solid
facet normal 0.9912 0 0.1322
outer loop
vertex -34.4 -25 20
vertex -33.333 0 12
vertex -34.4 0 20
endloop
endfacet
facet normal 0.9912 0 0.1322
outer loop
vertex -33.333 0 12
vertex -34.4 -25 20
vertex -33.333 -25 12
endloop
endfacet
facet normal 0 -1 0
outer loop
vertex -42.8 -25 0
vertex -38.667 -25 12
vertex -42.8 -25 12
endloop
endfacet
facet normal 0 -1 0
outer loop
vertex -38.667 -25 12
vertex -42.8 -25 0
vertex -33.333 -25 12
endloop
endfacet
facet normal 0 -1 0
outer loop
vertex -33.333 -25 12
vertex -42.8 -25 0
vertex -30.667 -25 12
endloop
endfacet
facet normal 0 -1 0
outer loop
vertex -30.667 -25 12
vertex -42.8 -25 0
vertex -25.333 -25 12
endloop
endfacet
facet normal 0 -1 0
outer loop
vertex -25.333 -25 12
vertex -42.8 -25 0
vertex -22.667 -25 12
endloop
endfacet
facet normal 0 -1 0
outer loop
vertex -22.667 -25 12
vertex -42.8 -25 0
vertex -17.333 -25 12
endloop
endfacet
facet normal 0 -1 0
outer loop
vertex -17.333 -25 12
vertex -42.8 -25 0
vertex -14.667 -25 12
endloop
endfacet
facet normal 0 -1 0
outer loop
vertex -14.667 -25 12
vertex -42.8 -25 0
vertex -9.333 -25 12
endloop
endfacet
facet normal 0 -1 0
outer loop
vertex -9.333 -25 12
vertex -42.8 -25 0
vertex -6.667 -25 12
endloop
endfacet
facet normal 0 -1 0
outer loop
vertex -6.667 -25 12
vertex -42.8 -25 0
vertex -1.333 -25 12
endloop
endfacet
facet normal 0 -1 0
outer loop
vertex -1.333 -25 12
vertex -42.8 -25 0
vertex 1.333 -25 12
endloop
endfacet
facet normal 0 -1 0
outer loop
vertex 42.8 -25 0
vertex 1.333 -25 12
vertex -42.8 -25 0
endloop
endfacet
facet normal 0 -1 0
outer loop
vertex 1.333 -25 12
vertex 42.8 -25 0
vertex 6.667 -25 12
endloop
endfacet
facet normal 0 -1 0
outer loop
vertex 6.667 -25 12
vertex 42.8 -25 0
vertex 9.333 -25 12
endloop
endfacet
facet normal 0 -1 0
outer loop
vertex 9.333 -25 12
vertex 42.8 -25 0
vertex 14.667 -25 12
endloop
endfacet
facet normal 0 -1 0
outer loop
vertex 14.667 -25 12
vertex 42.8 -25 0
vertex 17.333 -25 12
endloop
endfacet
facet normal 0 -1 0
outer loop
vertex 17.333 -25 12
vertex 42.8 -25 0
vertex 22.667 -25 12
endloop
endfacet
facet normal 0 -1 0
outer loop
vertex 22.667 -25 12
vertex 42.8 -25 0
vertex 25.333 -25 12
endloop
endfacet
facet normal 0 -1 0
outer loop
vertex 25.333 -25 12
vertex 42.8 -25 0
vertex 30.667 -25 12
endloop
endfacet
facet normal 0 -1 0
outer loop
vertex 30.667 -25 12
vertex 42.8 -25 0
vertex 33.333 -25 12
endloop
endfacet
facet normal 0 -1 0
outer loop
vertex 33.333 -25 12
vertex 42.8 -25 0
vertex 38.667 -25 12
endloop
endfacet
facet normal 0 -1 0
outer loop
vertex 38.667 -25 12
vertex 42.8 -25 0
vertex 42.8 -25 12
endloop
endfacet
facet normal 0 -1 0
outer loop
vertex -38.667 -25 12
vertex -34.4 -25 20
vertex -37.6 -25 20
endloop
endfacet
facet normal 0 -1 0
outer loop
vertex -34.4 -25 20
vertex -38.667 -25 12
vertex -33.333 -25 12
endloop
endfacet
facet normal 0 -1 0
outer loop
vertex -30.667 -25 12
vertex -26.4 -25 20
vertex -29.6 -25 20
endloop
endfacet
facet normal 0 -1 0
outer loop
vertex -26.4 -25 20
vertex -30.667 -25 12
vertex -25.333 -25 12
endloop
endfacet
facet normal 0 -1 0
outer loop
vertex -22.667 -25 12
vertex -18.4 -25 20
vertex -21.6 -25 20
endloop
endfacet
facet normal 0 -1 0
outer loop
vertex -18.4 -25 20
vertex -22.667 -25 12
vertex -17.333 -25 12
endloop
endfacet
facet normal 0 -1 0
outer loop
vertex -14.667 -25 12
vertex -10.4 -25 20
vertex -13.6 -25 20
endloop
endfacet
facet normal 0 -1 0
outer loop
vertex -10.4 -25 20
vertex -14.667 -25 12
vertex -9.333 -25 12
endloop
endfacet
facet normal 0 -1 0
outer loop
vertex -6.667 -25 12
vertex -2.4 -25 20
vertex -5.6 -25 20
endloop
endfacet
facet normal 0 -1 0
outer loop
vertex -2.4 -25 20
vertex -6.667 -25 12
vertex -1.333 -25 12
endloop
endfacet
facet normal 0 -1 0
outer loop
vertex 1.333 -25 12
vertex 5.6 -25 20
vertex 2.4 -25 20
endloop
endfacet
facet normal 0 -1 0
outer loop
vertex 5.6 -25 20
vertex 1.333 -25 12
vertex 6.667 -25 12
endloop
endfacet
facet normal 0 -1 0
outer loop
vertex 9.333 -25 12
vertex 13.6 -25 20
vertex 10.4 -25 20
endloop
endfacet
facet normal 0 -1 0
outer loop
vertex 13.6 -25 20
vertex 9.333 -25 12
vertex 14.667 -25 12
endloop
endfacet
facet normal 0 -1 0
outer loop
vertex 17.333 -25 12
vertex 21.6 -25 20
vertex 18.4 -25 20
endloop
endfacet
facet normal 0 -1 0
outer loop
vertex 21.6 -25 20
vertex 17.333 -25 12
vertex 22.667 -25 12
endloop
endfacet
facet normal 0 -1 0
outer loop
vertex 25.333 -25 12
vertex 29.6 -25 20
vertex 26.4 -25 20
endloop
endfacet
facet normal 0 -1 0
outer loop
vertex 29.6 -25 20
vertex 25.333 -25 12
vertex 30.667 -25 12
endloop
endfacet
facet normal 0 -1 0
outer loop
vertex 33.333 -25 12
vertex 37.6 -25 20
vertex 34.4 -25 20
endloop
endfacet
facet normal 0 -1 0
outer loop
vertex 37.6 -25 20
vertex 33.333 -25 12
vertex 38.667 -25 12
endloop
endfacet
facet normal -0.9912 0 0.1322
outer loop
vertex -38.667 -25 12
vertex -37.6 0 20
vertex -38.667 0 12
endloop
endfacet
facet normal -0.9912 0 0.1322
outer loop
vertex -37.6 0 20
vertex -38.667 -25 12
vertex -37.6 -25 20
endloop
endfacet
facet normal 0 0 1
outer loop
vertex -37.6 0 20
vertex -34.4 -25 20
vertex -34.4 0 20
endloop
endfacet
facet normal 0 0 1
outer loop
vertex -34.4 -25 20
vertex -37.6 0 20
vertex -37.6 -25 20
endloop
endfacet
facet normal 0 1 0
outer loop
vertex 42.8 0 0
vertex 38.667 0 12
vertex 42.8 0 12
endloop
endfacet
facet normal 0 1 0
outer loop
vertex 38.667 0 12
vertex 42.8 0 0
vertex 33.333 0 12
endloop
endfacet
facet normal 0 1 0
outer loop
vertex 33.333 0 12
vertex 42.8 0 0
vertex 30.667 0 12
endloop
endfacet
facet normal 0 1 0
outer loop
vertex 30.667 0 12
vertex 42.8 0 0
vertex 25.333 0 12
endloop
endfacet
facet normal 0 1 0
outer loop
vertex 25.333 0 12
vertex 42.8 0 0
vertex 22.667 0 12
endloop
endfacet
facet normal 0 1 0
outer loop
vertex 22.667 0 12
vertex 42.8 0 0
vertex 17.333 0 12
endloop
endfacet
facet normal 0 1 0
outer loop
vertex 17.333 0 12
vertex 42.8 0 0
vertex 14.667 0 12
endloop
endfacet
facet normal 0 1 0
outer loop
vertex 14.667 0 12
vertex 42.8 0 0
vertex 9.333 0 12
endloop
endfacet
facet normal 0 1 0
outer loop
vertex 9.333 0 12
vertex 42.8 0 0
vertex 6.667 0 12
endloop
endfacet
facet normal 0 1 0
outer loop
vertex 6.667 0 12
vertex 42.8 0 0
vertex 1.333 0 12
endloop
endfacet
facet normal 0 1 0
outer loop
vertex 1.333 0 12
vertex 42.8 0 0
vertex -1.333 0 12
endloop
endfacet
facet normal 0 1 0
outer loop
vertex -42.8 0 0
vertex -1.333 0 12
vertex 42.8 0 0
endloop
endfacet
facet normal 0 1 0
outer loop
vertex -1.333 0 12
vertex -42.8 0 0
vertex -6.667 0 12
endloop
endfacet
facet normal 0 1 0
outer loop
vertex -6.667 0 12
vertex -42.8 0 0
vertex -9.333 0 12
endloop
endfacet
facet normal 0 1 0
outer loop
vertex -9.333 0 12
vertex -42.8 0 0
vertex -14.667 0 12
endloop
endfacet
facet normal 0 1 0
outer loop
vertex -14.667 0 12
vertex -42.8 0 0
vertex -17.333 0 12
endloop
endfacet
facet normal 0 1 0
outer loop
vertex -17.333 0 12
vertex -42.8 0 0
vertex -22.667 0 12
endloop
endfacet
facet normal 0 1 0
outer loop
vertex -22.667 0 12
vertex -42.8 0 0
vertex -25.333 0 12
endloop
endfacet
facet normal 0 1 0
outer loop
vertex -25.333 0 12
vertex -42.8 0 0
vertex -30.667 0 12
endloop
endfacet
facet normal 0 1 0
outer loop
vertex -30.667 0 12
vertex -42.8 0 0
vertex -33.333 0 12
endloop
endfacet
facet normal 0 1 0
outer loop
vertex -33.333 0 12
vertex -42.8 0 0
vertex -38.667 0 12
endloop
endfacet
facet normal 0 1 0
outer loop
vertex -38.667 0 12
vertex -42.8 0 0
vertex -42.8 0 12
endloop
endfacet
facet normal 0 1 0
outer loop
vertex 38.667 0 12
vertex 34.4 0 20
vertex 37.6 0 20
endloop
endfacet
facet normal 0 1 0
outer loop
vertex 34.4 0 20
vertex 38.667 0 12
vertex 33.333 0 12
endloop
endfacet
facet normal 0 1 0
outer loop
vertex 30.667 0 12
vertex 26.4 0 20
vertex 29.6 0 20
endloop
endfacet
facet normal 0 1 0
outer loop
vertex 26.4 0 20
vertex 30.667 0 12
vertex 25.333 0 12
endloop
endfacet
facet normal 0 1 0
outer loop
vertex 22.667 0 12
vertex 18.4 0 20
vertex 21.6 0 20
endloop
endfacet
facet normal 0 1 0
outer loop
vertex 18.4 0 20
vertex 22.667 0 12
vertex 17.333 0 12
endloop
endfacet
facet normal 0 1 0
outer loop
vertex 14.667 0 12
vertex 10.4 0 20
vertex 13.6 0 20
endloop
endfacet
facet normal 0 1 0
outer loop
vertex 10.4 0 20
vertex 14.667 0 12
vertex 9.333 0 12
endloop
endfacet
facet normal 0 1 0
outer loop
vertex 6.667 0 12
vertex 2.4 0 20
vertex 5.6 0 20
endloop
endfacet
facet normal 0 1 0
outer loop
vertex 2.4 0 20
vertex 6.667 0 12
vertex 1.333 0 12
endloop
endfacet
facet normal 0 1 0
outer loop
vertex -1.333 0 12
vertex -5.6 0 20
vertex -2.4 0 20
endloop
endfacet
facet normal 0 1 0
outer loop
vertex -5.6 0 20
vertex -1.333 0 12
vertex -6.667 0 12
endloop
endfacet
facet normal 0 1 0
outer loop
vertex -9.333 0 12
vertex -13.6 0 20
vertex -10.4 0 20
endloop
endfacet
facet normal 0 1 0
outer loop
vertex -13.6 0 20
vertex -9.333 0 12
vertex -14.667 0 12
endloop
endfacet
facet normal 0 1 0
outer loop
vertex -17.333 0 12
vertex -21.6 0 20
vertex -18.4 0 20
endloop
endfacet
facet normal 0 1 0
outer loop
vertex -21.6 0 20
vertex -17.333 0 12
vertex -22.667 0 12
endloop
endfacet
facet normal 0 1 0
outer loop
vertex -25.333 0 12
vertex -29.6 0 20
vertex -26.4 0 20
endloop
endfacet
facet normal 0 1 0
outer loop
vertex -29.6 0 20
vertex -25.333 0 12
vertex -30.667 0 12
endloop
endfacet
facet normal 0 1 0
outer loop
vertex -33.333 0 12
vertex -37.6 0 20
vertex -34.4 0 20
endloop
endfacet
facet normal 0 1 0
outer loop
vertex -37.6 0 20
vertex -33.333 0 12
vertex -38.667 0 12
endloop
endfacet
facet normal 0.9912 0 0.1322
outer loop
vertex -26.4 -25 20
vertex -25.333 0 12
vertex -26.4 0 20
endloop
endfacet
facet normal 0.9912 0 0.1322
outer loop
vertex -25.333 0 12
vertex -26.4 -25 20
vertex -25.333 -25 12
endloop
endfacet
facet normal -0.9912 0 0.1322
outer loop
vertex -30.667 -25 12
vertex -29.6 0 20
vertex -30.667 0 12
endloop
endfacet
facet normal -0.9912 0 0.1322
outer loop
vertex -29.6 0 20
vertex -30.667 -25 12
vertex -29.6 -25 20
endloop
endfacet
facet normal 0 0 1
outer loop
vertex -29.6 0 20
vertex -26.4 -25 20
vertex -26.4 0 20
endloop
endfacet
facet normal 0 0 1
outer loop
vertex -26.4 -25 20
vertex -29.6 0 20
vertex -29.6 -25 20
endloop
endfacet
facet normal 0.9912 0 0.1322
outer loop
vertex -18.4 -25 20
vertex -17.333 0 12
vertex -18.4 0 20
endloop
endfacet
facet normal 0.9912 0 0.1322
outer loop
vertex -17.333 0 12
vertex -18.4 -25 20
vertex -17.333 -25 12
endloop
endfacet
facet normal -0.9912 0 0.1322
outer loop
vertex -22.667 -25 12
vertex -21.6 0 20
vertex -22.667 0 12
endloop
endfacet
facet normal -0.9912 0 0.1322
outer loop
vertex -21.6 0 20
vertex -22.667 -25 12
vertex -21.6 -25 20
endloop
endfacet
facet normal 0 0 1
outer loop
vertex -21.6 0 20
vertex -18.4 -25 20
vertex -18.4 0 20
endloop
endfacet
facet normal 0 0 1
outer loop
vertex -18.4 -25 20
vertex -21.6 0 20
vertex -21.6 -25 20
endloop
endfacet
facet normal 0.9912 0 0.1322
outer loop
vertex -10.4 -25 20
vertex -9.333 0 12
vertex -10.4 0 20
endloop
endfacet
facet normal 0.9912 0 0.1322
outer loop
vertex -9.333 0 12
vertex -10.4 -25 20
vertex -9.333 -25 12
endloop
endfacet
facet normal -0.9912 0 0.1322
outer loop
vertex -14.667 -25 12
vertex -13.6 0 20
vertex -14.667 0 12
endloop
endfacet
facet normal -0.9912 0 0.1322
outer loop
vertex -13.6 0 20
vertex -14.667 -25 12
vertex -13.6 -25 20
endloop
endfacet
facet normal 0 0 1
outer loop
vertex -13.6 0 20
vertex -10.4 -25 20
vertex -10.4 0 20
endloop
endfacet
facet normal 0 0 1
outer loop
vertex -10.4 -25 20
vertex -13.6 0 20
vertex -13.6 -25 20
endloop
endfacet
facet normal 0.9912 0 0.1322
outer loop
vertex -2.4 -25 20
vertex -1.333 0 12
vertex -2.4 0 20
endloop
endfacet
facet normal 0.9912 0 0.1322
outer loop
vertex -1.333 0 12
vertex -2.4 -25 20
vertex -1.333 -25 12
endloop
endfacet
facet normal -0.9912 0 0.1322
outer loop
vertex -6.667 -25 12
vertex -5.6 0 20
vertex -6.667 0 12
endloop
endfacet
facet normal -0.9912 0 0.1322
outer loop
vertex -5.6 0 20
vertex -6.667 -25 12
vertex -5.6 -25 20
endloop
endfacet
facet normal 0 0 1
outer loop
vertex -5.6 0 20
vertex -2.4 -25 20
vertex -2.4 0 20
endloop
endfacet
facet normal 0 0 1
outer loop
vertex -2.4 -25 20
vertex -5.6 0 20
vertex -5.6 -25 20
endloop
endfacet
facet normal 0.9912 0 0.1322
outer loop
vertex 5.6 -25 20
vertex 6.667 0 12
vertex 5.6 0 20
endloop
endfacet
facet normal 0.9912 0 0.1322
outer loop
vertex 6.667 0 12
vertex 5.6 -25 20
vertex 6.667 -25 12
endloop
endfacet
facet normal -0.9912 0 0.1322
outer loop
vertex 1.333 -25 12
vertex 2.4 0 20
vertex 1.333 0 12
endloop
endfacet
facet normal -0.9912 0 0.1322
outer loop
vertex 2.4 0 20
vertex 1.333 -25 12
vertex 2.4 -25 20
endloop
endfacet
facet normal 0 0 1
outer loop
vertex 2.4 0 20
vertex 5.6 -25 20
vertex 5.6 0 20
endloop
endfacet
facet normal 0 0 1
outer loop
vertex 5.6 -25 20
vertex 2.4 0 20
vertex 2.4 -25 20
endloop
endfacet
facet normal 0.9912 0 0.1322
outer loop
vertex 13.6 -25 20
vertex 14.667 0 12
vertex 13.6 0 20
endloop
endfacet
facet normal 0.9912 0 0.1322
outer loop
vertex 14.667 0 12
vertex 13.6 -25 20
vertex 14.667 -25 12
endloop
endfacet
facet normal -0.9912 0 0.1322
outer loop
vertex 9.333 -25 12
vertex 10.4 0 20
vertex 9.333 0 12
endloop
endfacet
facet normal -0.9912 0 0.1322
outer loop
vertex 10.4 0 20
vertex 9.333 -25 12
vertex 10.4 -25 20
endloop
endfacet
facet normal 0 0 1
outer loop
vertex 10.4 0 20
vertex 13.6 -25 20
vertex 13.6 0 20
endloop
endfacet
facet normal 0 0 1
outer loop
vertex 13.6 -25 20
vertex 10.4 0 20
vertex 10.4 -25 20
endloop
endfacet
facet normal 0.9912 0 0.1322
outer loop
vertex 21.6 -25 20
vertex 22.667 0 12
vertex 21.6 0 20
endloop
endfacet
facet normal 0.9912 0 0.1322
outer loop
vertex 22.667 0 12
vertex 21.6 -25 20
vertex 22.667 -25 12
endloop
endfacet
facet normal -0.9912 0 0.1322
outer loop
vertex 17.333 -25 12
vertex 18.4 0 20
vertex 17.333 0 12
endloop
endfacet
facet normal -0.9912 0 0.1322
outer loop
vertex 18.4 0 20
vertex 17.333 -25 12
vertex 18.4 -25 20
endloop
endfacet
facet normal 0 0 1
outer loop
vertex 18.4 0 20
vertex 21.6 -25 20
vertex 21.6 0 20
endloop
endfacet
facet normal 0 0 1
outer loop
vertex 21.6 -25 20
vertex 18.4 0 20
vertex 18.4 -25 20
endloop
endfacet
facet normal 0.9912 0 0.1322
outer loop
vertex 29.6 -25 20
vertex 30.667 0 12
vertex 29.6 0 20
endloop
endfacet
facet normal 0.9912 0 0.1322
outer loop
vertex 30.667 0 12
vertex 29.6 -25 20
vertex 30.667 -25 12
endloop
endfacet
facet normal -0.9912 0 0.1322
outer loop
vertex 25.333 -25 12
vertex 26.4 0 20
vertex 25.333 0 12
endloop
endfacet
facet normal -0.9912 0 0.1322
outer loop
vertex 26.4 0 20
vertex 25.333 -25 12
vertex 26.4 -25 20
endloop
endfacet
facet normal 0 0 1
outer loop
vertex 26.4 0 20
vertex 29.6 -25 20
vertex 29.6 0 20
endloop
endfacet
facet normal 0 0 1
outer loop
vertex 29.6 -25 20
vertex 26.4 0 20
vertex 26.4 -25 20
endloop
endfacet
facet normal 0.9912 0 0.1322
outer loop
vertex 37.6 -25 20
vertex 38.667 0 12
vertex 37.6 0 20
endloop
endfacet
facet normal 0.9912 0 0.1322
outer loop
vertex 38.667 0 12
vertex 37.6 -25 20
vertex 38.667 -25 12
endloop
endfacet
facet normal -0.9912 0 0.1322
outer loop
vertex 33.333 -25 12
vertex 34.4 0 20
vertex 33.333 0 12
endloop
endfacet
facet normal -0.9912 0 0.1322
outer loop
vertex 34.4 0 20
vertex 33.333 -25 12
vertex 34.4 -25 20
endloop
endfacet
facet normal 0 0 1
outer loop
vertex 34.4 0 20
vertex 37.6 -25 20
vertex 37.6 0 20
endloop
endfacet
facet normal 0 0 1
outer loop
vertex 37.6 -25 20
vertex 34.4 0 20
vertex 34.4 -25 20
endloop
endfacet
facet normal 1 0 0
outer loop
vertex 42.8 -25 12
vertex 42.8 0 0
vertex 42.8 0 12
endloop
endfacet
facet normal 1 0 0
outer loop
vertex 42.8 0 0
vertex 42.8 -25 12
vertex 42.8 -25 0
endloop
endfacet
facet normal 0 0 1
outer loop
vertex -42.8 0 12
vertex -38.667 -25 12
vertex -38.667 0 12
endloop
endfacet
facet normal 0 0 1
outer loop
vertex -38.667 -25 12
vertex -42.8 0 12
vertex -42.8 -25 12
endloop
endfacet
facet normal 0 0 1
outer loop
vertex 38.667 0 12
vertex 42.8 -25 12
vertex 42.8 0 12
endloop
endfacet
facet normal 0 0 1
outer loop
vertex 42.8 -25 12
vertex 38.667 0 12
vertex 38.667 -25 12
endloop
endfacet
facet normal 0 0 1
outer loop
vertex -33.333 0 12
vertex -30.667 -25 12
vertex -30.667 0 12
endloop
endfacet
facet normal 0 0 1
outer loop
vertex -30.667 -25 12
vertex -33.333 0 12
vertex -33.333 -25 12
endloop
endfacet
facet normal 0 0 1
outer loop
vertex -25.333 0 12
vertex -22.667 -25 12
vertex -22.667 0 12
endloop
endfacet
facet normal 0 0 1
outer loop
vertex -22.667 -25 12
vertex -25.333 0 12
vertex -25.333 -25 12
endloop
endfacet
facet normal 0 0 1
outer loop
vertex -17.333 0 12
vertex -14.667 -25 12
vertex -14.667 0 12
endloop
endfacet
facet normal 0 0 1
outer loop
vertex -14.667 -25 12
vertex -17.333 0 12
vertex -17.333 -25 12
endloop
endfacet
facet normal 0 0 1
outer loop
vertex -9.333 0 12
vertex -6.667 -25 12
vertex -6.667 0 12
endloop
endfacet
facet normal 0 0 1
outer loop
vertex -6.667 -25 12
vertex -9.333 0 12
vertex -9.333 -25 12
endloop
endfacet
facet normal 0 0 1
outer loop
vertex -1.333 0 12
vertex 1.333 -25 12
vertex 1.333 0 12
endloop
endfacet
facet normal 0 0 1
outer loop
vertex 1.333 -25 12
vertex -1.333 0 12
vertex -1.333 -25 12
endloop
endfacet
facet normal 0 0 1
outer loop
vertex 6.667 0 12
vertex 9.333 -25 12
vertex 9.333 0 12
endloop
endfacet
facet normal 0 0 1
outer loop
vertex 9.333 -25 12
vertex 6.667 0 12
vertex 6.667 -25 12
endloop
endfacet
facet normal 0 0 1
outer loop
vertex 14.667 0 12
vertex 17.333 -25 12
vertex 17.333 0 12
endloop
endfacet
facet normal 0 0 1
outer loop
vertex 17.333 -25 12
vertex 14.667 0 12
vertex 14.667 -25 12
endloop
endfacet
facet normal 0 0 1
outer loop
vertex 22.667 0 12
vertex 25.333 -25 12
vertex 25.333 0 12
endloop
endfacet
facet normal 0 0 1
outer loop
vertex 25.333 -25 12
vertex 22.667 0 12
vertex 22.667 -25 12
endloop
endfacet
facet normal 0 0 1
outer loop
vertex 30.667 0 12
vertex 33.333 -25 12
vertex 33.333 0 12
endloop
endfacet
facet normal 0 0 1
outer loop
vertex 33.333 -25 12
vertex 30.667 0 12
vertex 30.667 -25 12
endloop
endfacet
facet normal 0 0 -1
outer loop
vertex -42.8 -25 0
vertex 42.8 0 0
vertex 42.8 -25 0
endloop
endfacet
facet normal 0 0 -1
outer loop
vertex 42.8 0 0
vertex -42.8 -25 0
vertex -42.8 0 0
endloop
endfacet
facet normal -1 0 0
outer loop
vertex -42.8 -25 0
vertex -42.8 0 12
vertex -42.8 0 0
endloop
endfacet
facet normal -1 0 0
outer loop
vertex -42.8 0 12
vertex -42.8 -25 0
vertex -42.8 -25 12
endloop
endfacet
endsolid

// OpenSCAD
$fn = 32;

// ----------------------------------------------------------------------
// Toothed rack, 10 teeth
// 8 mm pitch, 8 mm teeth
// ----------------------------------------------------------------------

// --- parameters (mm) ---
bar_w = 25;     // bar width (Y)
bar_h = 12;     // bar height (Z)
teeth = 10;     // number of teeth
pitch = 8;      // tooth pitch
tooth_h = 8;    // tooth height above the bar
root_w = 5.6;   // tooth width at the root
crest_w = 3.2;  // tooth width at the crest

// --- derived feature positions (mm) ---
span = (teeth - 1) * pitch;  // = 72   distance between the outer teeth
bar_l = span + root_w + 8;   // = 85.6   bar length: teeth plus 4 mm at each end
tooth_x = -span / 2;         // = -36   X of the first tooth
height = bar_h + tooth_h;    // = 20   overall height
feature_centers = [
  [tooth_x + 0 * pitch, -bar_w / 2],
  [tooth_x + 1 * pitch, -bar_w / 2],
  [tooth_x + 2 * pitch, -bar_w / 2],
  [tooth_x + 3 * pitch, -bar_w / 2],
  [tooth_x + 4 * pitch, -bar_w / 2],
  [tooth_x + 5 * pitch, -bar_w / 2],
  [tooth_x + 6 * pitch, -bar_w / 2],
  [tooth_x + 7 * pitch, -bar_w / 2],
  [tooth_x + 8 * pitch, -bar_w / 2],
  [tooth_x + 9 * pitch, -bar_w / 2]
];   // tooth centre line, drives the tooth loop

// bar with a rack of teeth, one extruded trapezoium per centre
module rack_tooth() {
  linear_extrude(height = bar_w)
    polygon(points = [
      [0, 0],
      [root_w, 0],
      [root_w / 2 + crest_w / 2, tooth_h + 1],
      [root_w / 2 - crest_w / 2, tooth_h + 1]
    ]);
}

union() {
  translate([-bar_l / 2, -bar_w, 0]) cube([bar_l, bar_w, bar_h]);
  for (centre = feature_centers)
    translate([centre[0] - root_w / 2, 0, bar_h - 1]) rotate([90, 0, 0]) rack_tooth();
}
